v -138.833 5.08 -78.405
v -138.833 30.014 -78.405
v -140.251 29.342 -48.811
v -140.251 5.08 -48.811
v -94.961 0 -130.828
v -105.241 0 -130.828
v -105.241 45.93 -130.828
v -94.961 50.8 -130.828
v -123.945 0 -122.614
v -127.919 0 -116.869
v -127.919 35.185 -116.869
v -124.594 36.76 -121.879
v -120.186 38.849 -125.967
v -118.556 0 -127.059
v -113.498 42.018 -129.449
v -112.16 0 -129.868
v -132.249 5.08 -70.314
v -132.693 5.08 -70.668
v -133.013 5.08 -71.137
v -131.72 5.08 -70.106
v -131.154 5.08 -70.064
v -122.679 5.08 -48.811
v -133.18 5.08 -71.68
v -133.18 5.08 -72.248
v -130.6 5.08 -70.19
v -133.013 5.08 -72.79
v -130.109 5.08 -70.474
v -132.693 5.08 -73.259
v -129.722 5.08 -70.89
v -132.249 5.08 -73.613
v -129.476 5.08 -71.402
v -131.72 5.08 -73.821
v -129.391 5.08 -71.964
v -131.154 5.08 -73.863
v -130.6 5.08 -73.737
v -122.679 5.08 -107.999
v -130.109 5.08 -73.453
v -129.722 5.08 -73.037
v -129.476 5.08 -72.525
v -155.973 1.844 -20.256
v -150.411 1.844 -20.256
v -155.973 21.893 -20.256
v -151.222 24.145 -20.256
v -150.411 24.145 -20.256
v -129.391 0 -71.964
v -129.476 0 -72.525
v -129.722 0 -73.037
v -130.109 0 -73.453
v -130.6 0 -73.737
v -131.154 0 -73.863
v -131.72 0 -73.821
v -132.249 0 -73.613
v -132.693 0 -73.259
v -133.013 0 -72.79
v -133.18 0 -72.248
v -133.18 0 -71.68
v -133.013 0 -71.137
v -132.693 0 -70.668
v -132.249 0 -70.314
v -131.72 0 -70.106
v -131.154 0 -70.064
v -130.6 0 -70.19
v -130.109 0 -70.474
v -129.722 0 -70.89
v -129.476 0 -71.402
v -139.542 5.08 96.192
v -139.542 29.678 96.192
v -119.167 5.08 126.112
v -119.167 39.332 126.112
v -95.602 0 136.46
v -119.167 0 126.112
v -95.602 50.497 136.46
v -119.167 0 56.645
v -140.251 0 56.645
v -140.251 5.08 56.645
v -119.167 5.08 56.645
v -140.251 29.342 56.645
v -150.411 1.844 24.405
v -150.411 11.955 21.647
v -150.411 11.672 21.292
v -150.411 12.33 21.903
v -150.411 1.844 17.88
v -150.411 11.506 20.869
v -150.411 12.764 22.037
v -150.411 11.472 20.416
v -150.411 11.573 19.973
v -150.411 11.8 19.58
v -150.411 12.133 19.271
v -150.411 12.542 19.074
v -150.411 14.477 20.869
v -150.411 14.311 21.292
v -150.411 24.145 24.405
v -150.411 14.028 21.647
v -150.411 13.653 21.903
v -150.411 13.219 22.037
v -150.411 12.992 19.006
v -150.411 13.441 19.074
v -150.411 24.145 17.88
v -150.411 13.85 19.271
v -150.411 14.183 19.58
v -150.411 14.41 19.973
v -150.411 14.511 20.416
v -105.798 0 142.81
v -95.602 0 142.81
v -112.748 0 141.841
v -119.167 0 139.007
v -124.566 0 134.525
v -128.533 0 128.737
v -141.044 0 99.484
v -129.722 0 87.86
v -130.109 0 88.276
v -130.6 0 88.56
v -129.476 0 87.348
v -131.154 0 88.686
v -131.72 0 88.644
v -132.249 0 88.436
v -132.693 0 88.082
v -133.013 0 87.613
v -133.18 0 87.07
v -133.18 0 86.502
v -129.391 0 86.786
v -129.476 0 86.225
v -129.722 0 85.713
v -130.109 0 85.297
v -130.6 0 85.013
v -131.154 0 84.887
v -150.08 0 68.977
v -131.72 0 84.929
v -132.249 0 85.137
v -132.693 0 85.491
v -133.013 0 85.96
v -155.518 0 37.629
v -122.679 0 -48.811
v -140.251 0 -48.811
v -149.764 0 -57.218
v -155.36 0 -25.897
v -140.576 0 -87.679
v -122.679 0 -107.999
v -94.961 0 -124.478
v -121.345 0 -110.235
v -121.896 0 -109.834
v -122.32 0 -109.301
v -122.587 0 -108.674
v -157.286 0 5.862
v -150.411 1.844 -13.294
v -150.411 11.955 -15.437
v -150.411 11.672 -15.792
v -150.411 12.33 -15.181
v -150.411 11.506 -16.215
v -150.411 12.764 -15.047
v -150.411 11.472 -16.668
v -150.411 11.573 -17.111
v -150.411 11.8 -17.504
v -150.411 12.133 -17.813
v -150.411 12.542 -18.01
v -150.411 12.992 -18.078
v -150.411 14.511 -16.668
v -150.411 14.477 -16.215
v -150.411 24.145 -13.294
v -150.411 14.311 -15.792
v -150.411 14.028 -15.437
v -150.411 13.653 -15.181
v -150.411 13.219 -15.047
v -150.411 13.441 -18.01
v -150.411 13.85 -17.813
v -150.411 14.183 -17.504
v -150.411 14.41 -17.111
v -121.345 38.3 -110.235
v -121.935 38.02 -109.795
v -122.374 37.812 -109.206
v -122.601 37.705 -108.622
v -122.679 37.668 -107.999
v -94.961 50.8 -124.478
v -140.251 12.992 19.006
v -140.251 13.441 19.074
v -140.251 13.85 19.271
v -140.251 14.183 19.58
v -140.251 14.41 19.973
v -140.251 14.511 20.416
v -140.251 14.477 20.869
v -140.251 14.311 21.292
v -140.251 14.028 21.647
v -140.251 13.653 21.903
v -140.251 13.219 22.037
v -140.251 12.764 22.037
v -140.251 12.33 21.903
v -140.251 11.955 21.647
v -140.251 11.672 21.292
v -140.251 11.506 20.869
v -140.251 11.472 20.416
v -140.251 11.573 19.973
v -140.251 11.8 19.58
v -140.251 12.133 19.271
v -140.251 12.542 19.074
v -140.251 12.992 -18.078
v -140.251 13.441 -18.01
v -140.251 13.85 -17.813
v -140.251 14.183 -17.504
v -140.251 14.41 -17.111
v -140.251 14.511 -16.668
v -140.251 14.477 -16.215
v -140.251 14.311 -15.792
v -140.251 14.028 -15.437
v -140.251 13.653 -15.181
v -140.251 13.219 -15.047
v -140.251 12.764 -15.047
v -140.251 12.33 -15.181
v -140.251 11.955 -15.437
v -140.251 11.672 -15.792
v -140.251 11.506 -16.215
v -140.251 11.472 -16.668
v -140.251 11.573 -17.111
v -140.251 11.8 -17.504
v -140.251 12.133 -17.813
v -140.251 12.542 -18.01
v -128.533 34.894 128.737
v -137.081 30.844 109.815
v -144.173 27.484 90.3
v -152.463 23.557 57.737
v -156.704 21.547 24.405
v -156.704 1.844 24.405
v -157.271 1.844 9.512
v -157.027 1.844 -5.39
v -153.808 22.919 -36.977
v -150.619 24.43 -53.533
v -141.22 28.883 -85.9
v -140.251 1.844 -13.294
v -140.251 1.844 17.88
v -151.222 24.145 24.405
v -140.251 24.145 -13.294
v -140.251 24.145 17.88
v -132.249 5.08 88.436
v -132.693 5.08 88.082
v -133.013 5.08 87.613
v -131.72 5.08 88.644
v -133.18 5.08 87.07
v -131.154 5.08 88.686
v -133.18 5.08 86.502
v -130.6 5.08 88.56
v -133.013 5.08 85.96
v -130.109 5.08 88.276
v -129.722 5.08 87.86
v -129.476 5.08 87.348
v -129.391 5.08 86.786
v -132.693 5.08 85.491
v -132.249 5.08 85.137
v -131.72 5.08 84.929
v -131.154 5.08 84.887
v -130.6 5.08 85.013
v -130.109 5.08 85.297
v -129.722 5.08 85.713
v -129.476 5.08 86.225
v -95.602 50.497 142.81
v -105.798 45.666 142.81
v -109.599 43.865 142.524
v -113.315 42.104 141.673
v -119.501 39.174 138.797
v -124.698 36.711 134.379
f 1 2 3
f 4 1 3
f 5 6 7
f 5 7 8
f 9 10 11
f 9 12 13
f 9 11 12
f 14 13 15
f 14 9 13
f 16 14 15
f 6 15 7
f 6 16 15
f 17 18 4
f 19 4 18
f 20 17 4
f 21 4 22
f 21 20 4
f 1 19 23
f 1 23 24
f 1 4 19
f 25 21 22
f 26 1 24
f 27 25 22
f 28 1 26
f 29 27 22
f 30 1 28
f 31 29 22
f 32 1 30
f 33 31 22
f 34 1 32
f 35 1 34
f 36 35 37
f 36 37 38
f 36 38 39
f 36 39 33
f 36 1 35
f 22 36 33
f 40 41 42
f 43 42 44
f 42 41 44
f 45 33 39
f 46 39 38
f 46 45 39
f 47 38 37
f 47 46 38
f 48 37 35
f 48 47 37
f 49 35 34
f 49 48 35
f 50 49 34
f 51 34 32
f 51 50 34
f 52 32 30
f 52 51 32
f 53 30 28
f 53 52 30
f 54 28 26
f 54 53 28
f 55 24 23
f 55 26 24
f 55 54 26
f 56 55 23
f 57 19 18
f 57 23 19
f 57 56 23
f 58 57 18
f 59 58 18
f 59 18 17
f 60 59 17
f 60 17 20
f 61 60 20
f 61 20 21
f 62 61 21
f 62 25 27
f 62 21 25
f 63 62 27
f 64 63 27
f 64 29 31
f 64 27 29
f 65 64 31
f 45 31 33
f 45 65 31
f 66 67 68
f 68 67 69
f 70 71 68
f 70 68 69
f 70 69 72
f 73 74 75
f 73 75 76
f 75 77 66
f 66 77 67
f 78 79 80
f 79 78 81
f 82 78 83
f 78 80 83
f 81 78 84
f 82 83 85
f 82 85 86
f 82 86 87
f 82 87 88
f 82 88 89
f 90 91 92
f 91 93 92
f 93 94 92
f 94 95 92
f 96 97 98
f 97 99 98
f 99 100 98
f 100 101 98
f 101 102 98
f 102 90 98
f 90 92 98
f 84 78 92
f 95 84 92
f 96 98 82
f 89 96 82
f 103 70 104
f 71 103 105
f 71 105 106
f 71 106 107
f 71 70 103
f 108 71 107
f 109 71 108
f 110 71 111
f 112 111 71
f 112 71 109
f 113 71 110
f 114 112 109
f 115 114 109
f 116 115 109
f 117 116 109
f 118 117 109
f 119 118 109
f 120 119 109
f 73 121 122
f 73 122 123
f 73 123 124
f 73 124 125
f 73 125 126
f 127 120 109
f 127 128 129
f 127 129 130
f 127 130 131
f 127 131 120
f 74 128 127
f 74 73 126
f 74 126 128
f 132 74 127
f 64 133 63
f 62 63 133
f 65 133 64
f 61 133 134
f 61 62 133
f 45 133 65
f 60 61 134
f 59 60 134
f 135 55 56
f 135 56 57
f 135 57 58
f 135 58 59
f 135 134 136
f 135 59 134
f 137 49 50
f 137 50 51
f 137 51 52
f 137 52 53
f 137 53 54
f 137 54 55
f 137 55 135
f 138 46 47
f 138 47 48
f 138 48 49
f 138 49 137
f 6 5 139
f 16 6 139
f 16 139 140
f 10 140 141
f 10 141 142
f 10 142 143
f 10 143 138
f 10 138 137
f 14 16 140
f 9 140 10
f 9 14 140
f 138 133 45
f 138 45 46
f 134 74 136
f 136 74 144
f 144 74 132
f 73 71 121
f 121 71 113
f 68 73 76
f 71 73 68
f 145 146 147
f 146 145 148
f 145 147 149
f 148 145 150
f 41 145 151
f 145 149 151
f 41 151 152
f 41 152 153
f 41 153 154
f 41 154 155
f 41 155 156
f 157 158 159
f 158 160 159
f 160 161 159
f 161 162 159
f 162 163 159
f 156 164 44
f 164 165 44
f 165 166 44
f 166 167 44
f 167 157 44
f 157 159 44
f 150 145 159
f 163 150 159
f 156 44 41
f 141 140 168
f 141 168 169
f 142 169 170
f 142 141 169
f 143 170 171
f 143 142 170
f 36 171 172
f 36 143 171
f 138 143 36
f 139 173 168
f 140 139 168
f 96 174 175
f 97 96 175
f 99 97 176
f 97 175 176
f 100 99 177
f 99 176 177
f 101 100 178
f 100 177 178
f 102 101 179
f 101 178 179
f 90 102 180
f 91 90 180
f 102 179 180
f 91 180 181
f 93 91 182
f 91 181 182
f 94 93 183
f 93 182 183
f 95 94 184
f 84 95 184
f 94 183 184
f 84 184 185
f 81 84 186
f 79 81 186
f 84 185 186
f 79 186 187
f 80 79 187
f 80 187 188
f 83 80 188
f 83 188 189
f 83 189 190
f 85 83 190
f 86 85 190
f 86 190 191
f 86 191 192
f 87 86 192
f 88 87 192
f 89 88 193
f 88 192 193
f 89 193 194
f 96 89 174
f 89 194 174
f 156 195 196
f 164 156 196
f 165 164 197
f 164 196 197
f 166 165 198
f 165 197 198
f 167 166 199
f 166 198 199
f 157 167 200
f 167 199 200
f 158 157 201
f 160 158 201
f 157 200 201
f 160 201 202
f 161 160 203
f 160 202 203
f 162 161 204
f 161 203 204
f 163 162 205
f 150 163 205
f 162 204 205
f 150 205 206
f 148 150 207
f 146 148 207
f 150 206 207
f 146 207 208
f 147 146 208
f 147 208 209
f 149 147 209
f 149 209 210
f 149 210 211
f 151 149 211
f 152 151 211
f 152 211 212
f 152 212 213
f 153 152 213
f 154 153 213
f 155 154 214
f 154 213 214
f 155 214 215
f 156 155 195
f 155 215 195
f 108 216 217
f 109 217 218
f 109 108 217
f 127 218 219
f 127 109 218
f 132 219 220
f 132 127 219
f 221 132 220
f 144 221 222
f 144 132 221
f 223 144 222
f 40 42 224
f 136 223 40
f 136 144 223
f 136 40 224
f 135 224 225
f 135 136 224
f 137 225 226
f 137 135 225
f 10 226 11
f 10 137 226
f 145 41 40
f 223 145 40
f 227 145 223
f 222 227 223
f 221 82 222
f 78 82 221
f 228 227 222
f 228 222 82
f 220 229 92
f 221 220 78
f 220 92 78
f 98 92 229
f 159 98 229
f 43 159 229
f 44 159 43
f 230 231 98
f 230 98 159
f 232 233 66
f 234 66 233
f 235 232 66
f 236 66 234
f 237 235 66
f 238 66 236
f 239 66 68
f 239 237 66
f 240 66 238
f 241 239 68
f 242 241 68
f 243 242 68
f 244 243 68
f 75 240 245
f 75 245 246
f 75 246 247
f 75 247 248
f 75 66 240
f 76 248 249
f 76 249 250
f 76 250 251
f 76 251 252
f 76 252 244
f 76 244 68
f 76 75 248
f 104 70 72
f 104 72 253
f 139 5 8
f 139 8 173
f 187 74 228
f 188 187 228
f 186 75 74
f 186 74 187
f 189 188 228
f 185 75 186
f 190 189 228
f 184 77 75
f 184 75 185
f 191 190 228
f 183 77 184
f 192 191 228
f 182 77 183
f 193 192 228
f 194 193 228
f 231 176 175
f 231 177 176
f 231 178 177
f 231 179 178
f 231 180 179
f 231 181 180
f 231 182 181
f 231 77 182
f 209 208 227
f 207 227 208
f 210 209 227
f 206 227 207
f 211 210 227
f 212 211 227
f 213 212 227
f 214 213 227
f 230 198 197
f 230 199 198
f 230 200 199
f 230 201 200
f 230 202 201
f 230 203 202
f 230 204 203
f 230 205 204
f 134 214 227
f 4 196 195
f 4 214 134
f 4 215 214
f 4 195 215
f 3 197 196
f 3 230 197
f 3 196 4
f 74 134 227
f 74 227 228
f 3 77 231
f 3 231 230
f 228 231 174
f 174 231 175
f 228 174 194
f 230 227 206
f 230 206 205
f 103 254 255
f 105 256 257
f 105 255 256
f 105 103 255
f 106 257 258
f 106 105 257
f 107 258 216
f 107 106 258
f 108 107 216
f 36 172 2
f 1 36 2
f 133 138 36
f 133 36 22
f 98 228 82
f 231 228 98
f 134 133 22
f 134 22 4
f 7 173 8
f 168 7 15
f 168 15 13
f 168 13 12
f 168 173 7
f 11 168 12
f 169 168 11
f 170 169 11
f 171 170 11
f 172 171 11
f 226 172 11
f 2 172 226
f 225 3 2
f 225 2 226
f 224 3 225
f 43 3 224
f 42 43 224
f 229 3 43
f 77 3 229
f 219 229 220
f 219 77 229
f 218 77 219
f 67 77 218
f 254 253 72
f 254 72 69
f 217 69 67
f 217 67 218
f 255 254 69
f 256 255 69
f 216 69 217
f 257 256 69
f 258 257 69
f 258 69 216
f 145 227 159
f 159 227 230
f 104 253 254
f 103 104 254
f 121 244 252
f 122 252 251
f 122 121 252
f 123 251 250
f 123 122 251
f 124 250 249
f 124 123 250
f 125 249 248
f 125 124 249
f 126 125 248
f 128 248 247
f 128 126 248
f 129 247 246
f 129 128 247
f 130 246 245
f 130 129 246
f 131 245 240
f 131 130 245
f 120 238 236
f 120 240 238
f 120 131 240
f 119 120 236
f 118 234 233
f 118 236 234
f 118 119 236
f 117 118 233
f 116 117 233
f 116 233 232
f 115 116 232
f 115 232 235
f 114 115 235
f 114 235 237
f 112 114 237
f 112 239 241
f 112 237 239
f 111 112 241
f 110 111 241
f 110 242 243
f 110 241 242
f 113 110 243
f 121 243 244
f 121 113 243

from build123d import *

# Parameters (mm, degrees)
FRONT_SKETCH_R      = 1.905
BOSS_EXTRUDE1_DEPTH = 50.8
CUT_EXTRUDE1_DEPTH  = 45.72
CUT_EXTRUDE2_DEPTH  = 274.638700861
CUT_EXTRUDE3_DEPTH  = 18.03621965
SKETCH6_W           = 6.524310643
SKETCH6_H           = 22.300846009
SKETCH6_R           = 1.524
SKETCH6_W_2         = 6.962786951
BOSS_EXTRUDE2_DEPTH = 10.16


with BuildPart() as part:
    # front_sketch → Boss-Extrude1 (new body)
    with BuildSketch(Plane(origin=(0, 0, 0), x_dir=(1, 0, 0), z_dir=(0, 1, 0))):
        with BuildLine():
            Line((-94.961375831, 124.478458264), (-121.345326632, 110.234521439))
            ThreePointArc((-121.345326632, 110.234521439), (-122.32001306, 109.300728329), (-122.678671172, 107.99944144))
            Line((-122.678671172, 107.99944144), (-122.678671172, 48.810796684))
            Line((-122.678671172, 48.810796684), (-140.250849959, 48.810796684))
            Line((-140.250849959, 48.810796684), (-140.250849959, -56.645199257))
            Line((-140.250849959, -56.645199257), (-119.167015715, -56.645199257))
            Line((-119.167015715, -56.645199257), (-119.167015715, -126.112255785))
            Line((-119.167015715, -126.112255785), (-95.601645083, -136.460242597))
            Line((-95.601645083, -136.460242597), (-95.601645083, -142.810242597))
            Line((-95.601645083, -142.810242597), (-105.798207048, -142.810242597))
            ThreePointArc((-105.798207048, -142.810242597), (-119.167015715, -139.007347839), (-128.532661201, -128.737404395))
            ThreePointArc((-128.532661201, -128.737404395), (-157.286213724, -5.861503432), (-127.918775374, 116.869125935))
            ThreePointArc((-127.918775374, 116.869125935), (-118.556014486, 127.058910858), (-105.241228699, 130.828458264))
            Line((-105.241228699, 130.828458264), (-94.961375831, 130.828458264))
            Line((-94.961375831, 130.828458264), (-94.961375831, 124.478458264))
        make_face()
        with Locations((-131.296368682, 71.963600743)):
            Circle(FRONT_SKETCH_R, mode=Mode.SUBTRACT)
        with Locations((-131.296368682, -86.786399257)):
            Circle(FRONT_SKETCH_R, mode=Mode.SUBTRACT)
    extrude(amount=BOSS_EXTRUDE1_DEPTH)

    # Sketch1 → Cut-Extrude1 (cut)
    with BuildSketch(Plane(origin=(0, 50.8, 0), x_dir=(1, 0, 0), z_dir=(0, 1, 0))):
        Polygon((-122.678671172, 48.810796684), (-122.678671172, 107.99944144), (-138.833286115, 78.405119062), (-140.250849959, 48.810796684), align=None)
        Polygon((-119.167015715, -56.645199257), (-140.250849959, -56.645199257), (-139.542068037, -96.192486205), (-119.167015715, -126.112255785), align=None)
    extrude(amount=-CUT_EXTRUDE1_DEPTH, mode=Mode.SUBTRACT)

    # Sketch3 → Cut-Extrude2 (cut, through all)
    with BuildSketch(Plane.XY.offset(142.810242597)):
        Polygon((-94.961375831, 50.8), (-157.287069608, 21.270817167), (-157.287069608, 50.8), align=None)
    extrude(amount=-CUT_EXTRUDE2_DEPTH, mode=Mode.SUBTRACT)

    # Sketch4 → Cut-Extrude3 (cut, through all)
    with BuildSketch(Plane(origin=(-140.250849959, 0, 0), x_dir=(0, 0, -1), z_dir=(1, 0, 0))):
        Polygon((-24.404629664, 24.144542412), (20.256333242, 24.144542412), (20.256333242, 5.094542412), (20.256333242, 1.843696403), (-24.404629664, 1.843696403), (-24.404629664, 5.094542412), align=None)
    extrude(amount=-CUT_EXTRUDE3_DEPTH, mode=Mode.SUBTRACT)

    # Sketch6 → Boss-Extrude2 (add)
    with BuildSketch(Plane(origin=(-140.250849959, 0, 0), x_dir=(0, 0, -1), z_dir=(1, 0, 0))):
        with Locations((-21.142474343, 12.994119407)):
            Rectangle(SKETCH6_W, SKETCH6_H)
        with Locations((-20.530013168, 12.991512488)):
            Circle(SKETCH6_R, mode=Mode.SUBTRACT)
        with Locations((16.774939767, 12.994119407)):
            Rectangle(SKETCH6_W_2, SKETCH6_H)
        with Locations((16.553986832, 12.991512488)):
            Circle(SKETCH6_R, mode=Mode.SUBTRACT)
    extrude(amount=-BOSS_EXTRUDE2_DEPTH)


solid = part.part
